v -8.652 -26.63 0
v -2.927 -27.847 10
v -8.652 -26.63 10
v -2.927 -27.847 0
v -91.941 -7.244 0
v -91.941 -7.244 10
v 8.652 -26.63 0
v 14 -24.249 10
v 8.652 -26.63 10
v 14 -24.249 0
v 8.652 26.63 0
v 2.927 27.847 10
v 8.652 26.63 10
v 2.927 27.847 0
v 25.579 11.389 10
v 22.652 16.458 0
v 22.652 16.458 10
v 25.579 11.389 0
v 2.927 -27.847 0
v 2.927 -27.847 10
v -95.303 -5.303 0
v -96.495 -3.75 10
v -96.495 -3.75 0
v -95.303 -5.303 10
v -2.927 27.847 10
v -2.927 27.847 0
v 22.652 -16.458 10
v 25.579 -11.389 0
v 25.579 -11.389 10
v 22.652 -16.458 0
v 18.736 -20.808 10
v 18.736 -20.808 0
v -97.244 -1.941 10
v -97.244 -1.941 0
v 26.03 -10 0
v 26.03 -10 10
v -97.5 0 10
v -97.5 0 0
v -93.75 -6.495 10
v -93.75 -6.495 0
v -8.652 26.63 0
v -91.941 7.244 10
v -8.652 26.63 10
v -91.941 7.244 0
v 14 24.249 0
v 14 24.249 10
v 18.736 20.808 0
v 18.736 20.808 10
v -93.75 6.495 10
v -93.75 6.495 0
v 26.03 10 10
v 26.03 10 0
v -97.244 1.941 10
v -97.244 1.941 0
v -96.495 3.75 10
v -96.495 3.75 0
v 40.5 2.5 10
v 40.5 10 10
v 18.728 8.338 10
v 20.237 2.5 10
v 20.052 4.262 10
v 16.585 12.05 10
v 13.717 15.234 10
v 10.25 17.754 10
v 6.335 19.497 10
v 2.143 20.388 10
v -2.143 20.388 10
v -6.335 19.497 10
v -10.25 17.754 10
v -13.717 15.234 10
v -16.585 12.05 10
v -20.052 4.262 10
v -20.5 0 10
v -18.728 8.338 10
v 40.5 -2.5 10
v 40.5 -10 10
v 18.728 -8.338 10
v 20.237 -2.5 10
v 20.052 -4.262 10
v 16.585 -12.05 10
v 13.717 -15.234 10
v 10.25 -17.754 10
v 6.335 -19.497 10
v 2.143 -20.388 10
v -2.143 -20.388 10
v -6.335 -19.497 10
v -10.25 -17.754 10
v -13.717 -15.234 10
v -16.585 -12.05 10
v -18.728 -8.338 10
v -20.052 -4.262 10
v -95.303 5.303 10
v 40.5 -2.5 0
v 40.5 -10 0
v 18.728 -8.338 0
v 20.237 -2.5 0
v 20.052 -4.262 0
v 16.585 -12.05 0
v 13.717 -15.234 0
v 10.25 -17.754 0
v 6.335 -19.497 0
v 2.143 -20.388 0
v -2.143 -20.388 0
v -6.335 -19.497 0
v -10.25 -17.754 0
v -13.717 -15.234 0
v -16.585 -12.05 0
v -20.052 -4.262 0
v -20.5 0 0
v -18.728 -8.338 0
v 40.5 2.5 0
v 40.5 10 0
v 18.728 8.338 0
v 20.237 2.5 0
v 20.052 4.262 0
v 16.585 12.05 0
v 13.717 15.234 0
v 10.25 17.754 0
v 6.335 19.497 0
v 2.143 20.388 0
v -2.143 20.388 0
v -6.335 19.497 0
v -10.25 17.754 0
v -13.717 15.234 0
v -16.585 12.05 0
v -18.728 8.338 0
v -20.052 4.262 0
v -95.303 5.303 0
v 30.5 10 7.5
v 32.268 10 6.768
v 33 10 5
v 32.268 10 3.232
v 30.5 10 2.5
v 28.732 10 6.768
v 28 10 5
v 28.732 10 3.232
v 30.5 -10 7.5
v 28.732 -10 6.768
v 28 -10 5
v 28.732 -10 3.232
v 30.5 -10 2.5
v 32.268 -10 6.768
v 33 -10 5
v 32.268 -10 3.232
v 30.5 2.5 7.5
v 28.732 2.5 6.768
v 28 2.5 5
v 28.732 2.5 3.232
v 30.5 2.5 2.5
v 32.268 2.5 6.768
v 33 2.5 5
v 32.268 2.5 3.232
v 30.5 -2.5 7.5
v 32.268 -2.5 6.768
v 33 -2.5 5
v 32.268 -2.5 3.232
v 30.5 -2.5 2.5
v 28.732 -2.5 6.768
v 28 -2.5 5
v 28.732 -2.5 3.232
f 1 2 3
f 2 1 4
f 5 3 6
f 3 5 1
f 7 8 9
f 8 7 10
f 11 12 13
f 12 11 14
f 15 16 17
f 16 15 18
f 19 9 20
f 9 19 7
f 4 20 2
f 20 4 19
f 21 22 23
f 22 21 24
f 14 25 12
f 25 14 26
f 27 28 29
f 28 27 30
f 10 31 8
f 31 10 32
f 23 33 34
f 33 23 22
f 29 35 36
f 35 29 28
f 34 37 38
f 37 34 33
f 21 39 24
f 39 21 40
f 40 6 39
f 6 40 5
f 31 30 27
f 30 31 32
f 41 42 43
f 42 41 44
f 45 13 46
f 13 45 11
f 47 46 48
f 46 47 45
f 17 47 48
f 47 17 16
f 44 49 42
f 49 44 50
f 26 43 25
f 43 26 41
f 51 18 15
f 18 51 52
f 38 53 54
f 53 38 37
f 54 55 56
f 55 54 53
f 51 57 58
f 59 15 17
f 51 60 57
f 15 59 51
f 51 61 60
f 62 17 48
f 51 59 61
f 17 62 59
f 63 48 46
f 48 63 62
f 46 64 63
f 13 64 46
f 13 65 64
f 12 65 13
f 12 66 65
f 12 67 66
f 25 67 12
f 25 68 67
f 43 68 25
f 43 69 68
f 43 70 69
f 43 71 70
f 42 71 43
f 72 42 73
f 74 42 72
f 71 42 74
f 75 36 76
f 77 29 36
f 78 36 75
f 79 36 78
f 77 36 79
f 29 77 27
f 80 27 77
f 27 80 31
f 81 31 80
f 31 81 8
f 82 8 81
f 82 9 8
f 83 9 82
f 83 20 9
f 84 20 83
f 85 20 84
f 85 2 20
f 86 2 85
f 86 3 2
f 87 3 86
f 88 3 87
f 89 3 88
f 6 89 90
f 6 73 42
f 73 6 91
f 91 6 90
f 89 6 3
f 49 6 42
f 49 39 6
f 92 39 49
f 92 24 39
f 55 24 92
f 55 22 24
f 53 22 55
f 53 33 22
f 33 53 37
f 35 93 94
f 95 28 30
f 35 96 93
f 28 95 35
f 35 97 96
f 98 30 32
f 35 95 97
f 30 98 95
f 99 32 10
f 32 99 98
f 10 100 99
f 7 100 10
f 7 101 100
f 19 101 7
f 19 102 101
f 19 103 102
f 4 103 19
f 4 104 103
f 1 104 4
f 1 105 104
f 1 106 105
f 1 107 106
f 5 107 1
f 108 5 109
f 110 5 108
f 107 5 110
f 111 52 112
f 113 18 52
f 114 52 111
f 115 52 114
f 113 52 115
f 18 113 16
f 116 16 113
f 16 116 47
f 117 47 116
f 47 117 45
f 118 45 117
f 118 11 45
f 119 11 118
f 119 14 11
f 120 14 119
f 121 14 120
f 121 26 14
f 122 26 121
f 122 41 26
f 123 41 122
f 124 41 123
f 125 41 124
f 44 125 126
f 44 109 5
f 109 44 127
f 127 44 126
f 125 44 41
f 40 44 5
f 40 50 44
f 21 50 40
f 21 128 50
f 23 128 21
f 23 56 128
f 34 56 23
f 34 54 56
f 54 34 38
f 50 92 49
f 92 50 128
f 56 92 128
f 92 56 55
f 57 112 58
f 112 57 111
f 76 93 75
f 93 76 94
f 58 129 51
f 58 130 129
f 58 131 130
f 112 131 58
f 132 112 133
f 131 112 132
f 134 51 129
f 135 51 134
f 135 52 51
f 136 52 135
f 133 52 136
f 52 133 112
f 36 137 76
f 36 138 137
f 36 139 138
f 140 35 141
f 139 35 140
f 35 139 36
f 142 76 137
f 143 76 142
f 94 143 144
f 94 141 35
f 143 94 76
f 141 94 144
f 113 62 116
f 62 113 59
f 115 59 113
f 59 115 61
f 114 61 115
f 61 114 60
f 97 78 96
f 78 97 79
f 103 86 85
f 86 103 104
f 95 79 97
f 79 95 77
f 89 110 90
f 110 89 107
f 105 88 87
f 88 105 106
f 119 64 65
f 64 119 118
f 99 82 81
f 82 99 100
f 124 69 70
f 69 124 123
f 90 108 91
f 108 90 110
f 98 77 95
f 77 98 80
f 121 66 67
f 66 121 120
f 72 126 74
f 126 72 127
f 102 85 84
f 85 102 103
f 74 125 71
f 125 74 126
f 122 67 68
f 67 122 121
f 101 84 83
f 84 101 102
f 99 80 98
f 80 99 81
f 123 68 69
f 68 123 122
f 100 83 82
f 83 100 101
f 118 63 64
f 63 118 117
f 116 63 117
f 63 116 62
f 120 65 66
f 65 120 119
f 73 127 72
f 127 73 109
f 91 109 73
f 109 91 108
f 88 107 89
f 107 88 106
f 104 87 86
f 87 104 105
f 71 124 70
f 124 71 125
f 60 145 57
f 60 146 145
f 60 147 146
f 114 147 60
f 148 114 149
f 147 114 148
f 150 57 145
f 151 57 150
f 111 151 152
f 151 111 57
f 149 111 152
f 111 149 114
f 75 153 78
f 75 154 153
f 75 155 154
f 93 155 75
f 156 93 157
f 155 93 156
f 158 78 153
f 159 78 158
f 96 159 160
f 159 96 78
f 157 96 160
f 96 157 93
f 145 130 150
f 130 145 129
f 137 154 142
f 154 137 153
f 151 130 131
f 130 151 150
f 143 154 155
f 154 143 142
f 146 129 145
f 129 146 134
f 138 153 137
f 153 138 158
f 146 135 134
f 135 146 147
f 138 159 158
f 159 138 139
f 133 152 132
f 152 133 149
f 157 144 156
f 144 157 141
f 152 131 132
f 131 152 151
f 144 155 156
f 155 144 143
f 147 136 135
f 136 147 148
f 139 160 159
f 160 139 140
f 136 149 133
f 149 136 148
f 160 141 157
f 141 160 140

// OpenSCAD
inner_diameter=41; 
outer_diameter=inner_diameter+15;
Thickness=10;
Handle_length=90; 
Handle_tip_diameter=15;
Screw_diam=5;

difference(){
    union(){
        hull(){
            cylinder(Thickness,d=outer_diameter,center=false);
            translate([-Handle_length,0,0])cylinder(Thickness,d=Handle_tip_diameter,center=false);
        }
        translate([inner_diameter/2,-Screw_diam*2,0])cube([Screw_diam*4,Screw_diam*4,Thickness]);
}
union(){
    cylinder(Thickness,d=inner_diameter,center=false);
    translate([inner_diameter/3,-Screw_diam/2,0])cube([3*inner_diameter,Screw_diam,Thickness]);
    translate([inner_diameter/2+Screw_diam*2,-Screw_diam/2,Thickness/2])rotate([90,0,0])cylinder(Screw_diam*6,d=Screw_diam,center=true);
}
}
